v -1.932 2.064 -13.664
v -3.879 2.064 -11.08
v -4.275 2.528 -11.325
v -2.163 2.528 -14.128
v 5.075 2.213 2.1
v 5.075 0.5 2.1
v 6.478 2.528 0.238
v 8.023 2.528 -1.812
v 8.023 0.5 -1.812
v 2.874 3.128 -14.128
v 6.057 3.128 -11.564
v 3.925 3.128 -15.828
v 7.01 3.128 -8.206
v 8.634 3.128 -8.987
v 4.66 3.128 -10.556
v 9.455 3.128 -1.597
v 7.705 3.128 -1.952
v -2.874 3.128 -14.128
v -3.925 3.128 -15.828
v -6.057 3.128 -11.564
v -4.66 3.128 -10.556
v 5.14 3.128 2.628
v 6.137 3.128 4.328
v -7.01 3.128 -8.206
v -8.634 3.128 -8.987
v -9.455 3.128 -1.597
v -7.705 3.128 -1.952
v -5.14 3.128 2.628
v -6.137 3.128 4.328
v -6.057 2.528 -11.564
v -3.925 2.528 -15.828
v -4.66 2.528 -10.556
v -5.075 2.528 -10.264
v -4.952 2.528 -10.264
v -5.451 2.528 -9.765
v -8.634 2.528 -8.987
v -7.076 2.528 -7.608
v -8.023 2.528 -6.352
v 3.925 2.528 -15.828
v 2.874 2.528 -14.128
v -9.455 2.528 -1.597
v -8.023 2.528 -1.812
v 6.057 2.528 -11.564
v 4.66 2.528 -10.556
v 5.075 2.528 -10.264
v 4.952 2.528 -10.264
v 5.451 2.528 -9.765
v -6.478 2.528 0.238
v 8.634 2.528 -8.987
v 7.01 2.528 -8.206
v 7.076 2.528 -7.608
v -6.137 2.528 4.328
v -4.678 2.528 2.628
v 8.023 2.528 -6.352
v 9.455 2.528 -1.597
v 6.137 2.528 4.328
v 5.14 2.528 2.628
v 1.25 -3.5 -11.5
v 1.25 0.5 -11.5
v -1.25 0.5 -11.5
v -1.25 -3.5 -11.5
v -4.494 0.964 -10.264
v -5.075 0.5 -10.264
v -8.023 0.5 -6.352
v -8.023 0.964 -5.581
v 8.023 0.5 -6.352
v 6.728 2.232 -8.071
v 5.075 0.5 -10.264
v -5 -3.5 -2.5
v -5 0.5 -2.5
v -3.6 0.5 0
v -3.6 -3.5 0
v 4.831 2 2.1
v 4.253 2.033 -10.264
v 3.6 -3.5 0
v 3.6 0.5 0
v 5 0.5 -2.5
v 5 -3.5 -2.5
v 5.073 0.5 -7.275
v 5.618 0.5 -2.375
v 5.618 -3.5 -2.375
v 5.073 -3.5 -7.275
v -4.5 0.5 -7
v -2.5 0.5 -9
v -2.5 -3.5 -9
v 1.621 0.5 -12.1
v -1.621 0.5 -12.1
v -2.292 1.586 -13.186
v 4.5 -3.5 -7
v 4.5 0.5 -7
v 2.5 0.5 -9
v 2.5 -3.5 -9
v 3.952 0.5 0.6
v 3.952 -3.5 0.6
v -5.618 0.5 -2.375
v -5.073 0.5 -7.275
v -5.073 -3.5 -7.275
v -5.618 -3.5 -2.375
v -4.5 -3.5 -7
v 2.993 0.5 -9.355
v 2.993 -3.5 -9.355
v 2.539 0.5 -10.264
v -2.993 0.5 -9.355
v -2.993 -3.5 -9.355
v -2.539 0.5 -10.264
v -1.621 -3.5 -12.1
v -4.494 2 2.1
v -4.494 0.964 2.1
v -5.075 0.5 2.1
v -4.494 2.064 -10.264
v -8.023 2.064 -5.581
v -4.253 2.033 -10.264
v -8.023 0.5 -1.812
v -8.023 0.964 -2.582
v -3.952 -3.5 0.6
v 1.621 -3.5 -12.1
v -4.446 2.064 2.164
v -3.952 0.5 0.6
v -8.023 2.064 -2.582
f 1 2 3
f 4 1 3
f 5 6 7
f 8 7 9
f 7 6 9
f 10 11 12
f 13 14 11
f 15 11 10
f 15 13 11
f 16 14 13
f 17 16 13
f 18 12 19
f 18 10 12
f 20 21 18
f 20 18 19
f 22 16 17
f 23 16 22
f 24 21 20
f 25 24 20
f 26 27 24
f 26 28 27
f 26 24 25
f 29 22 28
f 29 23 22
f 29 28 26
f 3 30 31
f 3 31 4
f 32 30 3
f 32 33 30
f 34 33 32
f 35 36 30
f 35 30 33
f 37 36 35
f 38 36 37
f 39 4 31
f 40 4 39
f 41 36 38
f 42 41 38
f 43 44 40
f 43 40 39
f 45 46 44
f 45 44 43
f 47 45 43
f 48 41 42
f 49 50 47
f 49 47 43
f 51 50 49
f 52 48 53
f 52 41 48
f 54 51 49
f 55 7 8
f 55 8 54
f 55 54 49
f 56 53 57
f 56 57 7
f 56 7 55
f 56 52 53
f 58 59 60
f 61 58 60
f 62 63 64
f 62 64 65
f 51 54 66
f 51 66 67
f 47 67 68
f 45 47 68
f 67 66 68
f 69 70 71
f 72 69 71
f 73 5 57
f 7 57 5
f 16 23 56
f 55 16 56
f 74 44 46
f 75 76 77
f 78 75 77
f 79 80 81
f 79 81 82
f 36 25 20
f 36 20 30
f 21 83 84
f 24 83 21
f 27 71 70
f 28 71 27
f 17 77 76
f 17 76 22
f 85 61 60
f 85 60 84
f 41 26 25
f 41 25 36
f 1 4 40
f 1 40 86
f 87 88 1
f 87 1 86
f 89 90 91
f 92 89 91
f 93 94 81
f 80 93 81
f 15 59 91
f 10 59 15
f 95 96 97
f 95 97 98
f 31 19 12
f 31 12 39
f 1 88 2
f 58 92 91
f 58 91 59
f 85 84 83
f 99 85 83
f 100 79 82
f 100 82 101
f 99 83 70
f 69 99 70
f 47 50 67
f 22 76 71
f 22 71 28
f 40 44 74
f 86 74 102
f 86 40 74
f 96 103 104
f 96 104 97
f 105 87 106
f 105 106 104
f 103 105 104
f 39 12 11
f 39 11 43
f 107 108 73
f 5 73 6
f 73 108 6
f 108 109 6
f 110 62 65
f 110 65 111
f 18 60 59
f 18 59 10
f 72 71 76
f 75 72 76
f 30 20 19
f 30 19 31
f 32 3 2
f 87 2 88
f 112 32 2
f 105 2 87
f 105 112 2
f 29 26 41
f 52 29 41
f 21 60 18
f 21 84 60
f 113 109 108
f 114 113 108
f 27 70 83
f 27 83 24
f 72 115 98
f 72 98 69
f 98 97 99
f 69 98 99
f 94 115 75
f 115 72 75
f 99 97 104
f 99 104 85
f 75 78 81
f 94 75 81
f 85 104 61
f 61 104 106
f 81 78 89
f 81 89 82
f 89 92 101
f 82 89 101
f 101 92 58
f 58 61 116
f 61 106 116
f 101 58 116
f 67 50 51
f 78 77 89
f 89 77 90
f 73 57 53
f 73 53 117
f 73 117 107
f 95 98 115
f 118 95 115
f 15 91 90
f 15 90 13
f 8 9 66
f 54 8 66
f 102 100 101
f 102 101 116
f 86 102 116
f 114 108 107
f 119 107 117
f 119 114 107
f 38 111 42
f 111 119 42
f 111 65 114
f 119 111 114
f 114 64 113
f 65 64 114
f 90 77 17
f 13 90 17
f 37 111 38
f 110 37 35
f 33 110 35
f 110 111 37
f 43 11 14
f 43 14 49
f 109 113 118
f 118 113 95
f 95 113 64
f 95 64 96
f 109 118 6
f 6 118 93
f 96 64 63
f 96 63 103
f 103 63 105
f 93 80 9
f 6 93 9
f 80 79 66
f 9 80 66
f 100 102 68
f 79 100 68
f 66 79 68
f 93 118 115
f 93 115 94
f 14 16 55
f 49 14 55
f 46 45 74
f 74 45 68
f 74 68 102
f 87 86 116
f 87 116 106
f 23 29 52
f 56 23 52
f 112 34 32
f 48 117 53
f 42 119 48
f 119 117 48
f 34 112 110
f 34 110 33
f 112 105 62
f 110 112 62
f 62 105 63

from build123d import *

# Parameters (mm, degrees)
BOSS_EXTRUDE3_DEPTH  = 4
BOSS_EXTRUDE30_DEPTH = 2.1
CUT_EXTRUDE23_DEPTH  = 19.67655379
CUT_EXTRUDE24_DEPTH  = 18.444111581


with BuildPart() as part:
    # Sketch3<4> → Boss-Extrude3 (new body)
    with BuildSketch(Plane(origin=(0, 0.5, 0), x_dir=(1, 0, 0), z_dir=(0, 1, 0))):
        Polygon((5.617596648, 2.37486125), (5.073087868, 7.275440269), (2.993112649, 9.355415488), (1.620820393, 12.1), (-1.620820393, 12.1), (-2.993112649, 9.355415488), (-5.073087868, 7.275440269), (-5.617596648, 2.37486125), (-3.951674234, -0.6), (3.951674234, -0.6), align=None)
        Polygon((-4.5, 7), (-5, 2.5), (-3.599999905, 0), (3.599999905, 0), (5, 2.5), (4.5, 7), (2.5, 9), (1.25, 11.5), (-1.25, 11.5), (-2.5, 9), align=None, mode=Mode.SUBTRACT)
    extrude(amount=-BOSS_EXTRUDE3_DEPTH)

    # Sketch57 → Boss-Extrude30 (add)
    with BuildSketch(Plane(origin=(0, 0.5, 0), x_dir=(1, 0, 0), z_dir=(0, 1, 0))):
        Polygon((-8.022942498, 6.351803212), (-8.022942498, 1.811803212), (-5.075187344, -2.1), (5.075187344, -2.1), (8.022942498, 1.811803212), (8.022942498, 6.351803212), (5.075187344, 10.263606425), (-5.075187344, 10.263606425), align=None)
    extrude(amount=BOSS_EXTRUDE30_DEPTH)

    # Sweep3: sweep along a path in Sketch3
    with BuildLine(Plane(origin=(0, 0.5, 0), x_dir=(1, 0, 0), z_dir=(0, 1, 0))) as sweep3_path:
        Line((-4.5, 7), (-5, 2.5))
        Line((-5, 2.5), (-3.599999905, 0))
        Line((-3.599999905, 0), (3.599999905, 0))
        Line((3.599999905, 0), (5, 2.5))
        Line((5, 2.5), (4.5, 7))
        Line((4.5, 7), (2.5, 9))
        Line((2.5, 9), (1.25, 11.5))
        Line((1.25, 11.5), (-1.25, 11.5))
        Line((-1.25, 11.5), (-2.5, 9))
        Line((-2.5, 9), (-4.5, 7))
    # Sketch4 → Sweep3 (sweep)
    with BuildSketch(Plane(origin=(0, 0, 0), x_dir=(0, 0, -1), z_dir=(1, 0, 0))):
        Polygon((0, 0.5), (-0.6, 0.5), (-2.62762332, 2.52762332), (-4.32762332, 2.52762332), (-4.32762332, 3.12762332), (-2.62762332, 3.12762332), align=None)
    sweep(path=sweep3_path.line, transition=Transition.RIGHT)

    # Cut-Sweep10: sweep along a path in Sketch61
    with BuildLine(Plane(origin=(0, 0.5, 0), x_dir=(1, 0, 0), z_dir=(0, 1, 0))) as cut_sweep10_path:
        Line((1.25, 11.5), (2.5, 9))
        Line((2.5, 9), (4.5, 7))
        Line((4.5, 7), (5, 2.5))
        Line((5, 2.5), (3.599999905, 0))
        Line((3.599999905, 0), (-3.599999905, 0))
        Line((-3.599999905, 0), (-5, 2.5))
        Line((-5, 2.5), (-4.5, 7))
        Line((-4.5, 7), (-2.5, 9))
        Line((-2.5, 9), (-1.25, 11.5))
        Line((-1.25, 11.5), (1.25, 11.5))
    # Sketch60 → Cut-Sweep10 (sweep, cut)
    with BuildSketch(Plane(origin=(0, 0, 0), x_dir=(0, 0, -1), z_dir=(1, 0, 0))):
        Polygon((-4.32762332, 3.12762332), (-2.62762332, 3.12762332), (0, 0.5), (0.419943975, 0.080056025), (0.419943975, 3.72762332), (0, 3.72762332), (-4.32762332, 3.72762332), align=None)
    sweep(path=cut_sweep10_path.line, transition=Transition.RIGHT, mode=Mode.SUBTRACT)


with BuildPart() as cut_sweep10_kept_piece:
    # of the separate pieces the step leaves, the one the design keeps (cut_sweep10_pieces_kept)
    add(part.part.solids().sort_by_distance((5.617596648, 0.5, -2.37486125))[0])

    # Sketch62 → Cut-Extrude23 (cut, symmetric)
    with BuildSketch(Plane(origin=(0.147112643, 0, -0.195225071), x_dir=(0, -1, 0), z_dir=(0.6018150231520525, 0, -0.7986355100472898))):
        Polygon((-2.52762332, 10.230017371), (-2.52762332, 11.230017371), (-0.5, 11.230017371), (-0.5, 10.230017371), (-0.96381166, 9.766205711), (-2.06381166, 9.766205711), align=None)
    extrude(amount=CUT_EXTRUDE23_DEPTH, both=True, mode=Mode.SUBTRACT)

    # Sketch64 → Cut-Extrude24 (cut, symmetric)
    with BuildSketch(Plane(origin=(-3.776568435, 0, -5.011675586), x_dir=(0, -1, 0), z_dir=(-0.6018150231520465, 0, -0.7986355100472943))):
        Polygon((-2.52762332, 5.317036382), (-2.52762332, 6.317036382), (-0.5, 6.317036382), (-0.5, 5.317036382), (-0.96381166, 4.853224722), (-2.06381166, 4.853224722), align=None)
    extrude(amount=CUT_EXTRUDE24_DEPTH, both=True, mode=Mode.SUBTRACT)


solid = cut_sweep10_kept_piece.part
